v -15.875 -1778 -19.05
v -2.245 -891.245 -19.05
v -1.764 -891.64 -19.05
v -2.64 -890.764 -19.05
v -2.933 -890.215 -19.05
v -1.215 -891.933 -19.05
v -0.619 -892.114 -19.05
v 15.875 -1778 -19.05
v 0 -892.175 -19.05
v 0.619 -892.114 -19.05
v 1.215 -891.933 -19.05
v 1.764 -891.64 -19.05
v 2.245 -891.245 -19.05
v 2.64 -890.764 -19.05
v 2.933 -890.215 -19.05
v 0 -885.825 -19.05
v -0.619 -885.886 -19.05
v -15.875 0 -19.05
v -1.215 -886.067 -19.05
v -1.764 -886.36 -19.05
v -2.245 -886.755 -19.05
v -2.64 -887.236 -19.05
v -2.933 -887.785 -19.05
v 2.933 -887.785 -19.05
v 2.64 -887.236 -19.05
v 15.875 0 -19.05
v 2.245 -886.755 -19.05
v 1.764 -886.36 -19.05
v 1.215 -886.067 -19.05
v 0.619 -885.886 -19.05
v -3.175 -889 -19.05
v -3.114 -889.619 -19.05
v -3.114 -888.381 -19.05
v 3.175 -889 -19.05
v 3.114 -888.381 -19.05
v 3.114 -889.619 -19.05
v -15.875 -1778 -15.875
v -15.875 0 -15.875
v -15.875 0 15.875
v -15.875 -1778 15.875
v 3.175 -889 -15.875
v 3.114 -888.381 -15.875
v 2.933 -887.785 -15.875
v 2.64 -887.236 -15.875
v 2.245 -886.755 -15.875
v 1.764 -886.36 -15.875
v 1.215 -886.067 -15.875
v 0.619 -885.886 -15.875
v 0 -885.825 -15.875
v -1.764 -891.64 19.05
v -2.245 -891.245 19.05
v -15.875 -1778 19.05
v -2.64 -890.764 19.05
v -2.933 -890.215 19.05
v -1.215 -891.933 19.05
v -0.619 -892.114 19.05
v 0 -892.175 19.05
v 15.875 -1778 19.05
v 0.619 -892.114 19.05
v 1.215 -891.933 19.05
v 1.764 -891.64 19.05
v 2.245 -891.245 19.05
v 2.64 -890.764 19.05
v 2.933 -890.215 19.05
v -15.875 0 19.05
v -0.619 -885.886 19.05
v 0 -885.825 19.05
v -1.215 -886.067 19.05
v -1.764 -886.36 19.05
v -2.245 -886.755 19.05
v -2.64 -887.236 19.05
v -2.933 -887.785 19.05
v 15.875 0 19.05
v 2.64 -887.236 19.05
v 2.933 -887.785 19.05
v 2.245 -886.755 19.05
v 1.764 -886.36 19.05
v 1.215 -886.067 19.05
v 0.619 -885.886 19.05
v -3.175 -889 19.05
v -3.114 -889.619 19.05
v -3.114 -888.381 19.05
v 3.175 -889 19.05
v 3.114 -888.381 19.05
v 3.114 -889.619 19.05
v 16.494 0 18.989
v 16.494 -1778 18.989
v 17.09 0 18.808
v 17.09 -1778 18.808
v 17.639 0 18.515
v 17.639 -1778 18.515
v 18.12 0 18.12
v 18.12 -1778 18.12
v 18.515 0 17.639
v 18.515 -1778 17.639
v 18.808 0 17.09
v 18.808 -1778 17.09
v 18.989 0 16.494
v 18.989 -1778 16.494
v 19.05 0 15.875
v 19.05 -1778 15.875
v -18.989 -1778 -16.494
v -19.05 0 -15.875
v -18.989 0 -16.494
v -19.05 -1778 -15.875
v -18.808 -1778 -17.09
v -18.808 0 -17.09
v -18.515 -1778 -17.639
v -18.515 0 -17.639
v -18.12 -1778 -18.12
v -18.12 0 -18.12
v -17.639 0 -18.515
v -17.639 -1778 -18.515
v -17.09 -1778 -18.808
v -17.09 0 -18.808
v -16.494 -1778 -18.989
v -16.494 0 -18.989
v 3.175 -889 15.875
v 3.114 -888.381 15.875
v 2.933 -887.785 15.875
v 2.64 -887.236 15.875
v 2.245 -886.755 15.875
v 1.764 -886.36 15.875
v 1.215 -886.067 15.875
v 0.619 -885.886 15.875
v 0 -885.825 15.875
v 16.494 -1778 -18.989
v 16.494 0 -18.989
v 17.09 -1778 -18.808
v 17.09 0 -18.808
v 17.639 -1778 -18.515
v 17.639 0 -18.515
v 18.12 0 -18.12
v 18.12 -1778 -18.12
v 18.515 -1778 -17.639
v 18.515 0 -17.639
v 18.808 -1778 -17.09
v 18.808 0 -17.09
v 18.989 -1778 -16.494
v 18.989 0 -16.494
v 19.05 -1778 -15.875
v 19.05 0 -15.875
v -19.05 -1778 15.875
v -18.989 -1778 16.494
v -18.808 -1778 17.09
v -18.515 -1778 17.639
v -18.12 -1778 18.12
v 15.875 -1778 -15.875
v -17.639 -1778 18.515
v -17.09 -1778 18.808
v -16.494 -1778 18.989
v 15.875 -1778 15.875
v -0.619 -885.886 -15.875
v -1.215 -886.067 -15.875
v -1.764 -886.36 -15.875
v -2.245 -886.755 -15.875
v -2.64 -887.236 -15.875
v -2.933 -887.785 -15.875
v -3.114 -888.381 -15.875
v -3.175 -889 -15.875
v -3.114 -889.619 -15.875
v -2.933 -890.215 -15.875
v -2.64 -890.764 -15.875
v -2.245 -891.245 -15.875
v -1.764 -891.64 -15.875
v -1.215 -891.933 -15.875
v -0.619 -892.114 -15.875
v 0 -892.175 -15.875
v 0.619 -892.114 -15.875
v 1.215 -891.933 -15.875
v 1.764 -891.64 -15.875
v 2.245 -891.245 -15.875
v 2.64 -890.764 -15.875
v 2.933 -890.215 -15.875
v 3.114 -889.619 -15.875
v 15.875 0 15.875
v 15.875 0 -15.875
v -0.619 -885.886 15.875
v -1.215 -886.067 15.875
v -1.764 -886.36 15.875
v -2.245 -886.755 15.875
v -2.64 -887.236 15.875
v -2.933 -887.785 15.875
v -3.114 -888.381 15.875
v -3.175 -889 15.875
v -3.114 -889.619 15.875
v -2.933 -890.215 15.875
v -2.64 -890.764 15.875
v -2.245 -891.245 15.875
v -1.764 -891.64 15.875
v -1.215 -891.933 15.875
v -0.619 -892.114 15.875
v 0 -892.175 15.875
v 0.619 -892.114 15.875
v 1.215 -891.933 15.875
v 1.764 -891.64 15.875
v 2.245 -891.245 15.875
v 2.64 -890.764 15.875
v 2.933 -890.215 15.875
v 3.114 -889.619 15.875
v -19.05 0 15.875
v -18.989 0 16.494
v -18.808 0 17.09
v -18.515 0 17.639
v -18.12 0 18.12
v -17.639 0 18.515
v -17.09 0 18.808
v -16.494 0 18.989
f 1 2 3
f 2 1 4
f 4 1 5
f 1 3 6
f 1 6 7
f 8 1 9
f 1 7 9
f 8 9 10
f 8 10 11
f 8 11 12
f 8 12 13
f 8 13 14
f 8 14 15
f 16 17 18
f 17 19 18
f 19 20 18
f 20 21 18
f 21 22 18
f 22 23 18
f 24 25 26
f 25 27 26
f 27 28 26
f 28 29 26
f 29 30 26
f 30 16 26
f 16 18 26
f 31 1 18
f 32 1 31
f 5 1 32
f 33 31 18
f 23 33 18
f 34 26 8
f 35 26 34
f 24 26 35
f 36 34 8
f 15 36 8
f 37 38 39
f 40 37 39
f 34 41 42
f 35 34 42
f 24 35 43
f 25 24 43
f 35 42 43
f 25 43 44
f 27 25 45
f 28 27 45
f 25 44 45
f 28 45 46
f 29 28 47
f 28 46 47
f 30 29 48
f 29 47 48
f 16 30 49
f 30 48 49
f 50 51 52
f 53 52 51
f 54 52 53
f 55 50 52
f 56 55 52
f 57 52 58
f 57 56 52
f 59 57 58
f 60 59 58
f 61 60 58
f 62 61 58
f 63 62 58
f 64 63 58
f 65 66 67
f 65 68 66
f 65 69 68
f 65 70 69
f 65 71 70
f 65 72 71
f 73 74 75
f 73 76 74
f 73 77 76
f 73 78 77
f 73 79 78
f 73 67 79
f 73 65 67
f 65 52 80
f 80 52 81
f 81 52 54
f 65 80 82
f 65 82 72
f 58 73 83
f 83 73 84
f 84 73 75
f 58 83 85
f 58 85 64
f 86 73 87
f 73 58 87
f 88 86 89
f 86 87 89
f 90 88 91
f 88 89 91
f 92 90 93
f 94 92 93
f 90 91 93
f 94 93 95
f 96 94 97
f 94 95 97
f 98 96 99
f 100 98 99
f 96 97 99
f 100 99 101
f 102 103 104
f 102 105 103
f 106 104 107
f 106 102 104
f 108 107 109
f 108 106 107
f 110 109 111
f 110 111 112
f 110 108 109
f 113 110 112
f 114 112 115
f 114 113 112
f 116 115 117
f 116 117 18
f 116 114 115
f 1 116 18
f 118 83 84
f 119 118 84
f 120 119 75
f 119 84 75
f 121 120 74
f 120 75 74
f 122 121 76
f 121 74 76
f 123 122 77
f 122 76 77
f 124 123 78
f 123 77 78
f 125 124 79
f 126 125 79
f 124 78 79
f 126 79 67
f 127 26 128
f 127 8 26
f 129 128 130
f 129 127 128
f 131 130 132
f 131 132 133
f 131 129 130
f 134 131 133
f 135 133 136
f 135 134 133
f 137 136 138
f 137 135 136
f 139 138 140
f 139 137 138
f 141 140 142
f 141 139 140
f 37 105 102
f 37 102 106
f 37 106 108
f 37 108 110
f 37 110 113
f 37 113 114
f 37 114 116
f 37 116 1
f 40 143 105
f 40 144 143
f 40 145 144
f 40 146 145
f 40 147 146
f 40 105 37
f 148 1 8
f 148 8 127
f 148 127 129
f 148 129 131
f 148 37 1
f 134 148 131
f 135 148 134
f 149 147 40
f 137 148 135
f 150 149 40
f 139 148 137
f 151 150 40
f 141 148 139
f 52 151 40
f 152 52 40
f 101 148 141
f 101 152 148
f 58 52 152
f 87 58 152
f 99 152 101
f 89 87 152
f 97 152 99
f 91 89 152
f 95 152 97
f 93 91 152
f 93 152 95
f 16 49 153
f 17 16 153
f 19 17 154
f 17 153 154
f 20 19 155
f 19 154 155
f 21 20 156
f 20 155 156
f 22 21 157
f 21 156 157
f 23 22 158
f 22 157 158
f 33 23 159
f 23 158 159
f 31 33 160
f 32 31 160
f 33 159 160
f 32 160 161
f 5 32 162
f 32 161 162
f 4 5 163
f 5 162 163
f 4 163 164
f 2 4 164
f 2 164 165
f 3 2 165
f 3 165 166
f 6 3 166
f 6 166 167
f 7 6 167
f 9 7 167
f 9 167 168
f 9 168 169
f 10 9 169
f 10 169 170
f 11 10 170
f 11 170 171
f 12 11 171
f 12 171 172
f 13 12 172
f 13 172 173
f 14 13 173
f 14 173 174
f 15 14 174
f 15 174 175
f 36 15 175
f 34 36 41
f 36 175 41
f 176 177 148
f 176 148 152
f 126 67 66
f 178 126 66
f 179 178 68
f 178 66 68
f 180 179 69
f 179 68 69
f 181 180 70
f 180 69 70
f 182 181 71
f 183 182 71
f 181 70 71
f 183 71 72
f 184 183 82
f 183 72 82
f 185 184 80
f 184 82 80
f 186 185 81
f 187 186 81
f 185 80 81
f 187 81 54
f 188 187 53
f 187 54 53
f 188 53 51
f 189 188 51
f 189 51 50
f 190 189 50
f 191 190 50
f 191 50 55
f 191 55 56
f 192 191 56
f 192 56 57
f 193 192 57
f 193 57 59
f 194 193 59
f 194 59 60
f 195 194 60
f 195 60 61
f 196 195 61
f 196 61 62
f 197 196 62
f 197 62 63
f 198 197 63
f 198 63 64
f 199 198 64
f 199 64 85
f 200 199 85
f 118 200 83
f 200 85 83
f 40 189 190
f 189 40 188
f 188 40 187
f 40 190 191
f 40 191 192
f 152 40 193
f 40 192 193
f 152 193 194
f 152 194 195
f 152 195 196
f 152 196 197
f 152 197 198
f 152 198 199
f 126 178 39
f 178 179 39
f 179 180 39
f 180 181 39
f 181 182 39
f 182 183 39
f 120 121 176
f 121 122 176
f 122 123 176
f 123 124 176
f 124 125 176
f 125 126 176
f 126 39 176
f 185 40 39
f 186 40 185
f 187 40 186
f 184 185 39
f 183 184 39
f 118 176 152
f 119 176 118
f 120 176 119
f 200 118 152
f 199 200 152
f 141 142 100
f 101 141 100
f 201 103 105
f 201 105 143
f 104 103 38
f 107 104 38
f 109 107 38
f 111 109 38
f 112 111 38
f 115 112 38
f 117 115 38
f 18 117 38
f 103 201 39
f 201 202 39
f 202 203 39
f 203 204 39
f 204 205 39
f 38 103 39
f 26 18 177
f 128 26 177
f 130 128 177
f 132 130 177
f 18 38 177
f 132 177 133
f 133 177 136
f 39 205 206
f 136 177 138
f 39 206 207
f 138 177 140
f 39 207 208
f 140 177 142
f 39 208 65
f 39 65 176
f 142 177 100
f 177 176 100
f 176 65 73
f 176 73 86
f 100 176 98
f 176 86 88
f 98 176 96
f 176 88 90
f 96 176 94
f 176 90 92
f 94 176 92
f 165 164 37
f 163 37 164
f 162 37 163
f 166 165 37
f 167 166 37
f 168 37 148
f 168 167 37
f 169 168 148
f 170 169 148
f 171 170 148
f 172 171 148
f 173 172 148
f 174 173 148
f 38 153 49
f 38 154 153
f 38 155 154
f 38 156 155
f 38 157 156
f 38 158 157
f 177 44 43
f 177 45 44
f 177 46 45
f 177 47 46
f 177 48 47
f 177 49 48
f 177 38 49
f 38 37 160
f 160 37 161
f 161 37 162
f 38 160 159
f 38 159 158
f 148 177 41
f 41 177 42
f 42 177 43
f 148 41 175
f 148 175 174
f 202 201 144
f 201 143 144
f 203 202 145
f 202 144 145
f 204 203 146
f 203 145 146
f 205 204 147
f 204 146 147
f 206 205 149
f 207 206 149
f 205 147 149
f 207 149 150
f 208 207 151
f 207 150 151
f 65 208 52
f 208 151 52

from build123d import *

# Parameters (mm, degrees)
F0_W     = 38.1
F0_H     = 38.1
F0_W_2   = 31.75
F0_H_2   = 31.75
F1_DEPTH = 1778
F2_R     = 3.175
F4_DEPTH = 38.101


with BuildPart() as f1:
    # F0 (on Front) → F1 (new body)
    with BuildSketch(Plane.XZ):
        Rectangle(F0_W, F0_H)
        Rectangle(F0_W_2, F0_H_2, mode=Mode.SUBTRACT)
    extrude(amount=F1_DEPTH)

    # F2
    f2_edges = [f1.edges().sort_by_distance(p)[0] for p in [
        (19.05, -889, 19.05),
        (19.05, -889, -19.05),
        (-19.05, -889, -19.05),
        (-19.05, -889, 19.05),
    ]]
    fillet(f2_edges, radius=F2_R)

    # F3 (on face) → F4 (cut, through all)
    with BuildSketch(Plane.XY.offset(19.05)):
        with BuildLine():
            ThreePointArc((0, -885.825), (-2.245064, -891.245064), (3.175, -889))
            ThreePointArc((3.175, -889), (2.245064, -886.754936), (0, -885.825))
        make_face()
    extrude(amount=-F4_DEPTH, mode=Mode.SUBTRACT)


solid = f1.part
